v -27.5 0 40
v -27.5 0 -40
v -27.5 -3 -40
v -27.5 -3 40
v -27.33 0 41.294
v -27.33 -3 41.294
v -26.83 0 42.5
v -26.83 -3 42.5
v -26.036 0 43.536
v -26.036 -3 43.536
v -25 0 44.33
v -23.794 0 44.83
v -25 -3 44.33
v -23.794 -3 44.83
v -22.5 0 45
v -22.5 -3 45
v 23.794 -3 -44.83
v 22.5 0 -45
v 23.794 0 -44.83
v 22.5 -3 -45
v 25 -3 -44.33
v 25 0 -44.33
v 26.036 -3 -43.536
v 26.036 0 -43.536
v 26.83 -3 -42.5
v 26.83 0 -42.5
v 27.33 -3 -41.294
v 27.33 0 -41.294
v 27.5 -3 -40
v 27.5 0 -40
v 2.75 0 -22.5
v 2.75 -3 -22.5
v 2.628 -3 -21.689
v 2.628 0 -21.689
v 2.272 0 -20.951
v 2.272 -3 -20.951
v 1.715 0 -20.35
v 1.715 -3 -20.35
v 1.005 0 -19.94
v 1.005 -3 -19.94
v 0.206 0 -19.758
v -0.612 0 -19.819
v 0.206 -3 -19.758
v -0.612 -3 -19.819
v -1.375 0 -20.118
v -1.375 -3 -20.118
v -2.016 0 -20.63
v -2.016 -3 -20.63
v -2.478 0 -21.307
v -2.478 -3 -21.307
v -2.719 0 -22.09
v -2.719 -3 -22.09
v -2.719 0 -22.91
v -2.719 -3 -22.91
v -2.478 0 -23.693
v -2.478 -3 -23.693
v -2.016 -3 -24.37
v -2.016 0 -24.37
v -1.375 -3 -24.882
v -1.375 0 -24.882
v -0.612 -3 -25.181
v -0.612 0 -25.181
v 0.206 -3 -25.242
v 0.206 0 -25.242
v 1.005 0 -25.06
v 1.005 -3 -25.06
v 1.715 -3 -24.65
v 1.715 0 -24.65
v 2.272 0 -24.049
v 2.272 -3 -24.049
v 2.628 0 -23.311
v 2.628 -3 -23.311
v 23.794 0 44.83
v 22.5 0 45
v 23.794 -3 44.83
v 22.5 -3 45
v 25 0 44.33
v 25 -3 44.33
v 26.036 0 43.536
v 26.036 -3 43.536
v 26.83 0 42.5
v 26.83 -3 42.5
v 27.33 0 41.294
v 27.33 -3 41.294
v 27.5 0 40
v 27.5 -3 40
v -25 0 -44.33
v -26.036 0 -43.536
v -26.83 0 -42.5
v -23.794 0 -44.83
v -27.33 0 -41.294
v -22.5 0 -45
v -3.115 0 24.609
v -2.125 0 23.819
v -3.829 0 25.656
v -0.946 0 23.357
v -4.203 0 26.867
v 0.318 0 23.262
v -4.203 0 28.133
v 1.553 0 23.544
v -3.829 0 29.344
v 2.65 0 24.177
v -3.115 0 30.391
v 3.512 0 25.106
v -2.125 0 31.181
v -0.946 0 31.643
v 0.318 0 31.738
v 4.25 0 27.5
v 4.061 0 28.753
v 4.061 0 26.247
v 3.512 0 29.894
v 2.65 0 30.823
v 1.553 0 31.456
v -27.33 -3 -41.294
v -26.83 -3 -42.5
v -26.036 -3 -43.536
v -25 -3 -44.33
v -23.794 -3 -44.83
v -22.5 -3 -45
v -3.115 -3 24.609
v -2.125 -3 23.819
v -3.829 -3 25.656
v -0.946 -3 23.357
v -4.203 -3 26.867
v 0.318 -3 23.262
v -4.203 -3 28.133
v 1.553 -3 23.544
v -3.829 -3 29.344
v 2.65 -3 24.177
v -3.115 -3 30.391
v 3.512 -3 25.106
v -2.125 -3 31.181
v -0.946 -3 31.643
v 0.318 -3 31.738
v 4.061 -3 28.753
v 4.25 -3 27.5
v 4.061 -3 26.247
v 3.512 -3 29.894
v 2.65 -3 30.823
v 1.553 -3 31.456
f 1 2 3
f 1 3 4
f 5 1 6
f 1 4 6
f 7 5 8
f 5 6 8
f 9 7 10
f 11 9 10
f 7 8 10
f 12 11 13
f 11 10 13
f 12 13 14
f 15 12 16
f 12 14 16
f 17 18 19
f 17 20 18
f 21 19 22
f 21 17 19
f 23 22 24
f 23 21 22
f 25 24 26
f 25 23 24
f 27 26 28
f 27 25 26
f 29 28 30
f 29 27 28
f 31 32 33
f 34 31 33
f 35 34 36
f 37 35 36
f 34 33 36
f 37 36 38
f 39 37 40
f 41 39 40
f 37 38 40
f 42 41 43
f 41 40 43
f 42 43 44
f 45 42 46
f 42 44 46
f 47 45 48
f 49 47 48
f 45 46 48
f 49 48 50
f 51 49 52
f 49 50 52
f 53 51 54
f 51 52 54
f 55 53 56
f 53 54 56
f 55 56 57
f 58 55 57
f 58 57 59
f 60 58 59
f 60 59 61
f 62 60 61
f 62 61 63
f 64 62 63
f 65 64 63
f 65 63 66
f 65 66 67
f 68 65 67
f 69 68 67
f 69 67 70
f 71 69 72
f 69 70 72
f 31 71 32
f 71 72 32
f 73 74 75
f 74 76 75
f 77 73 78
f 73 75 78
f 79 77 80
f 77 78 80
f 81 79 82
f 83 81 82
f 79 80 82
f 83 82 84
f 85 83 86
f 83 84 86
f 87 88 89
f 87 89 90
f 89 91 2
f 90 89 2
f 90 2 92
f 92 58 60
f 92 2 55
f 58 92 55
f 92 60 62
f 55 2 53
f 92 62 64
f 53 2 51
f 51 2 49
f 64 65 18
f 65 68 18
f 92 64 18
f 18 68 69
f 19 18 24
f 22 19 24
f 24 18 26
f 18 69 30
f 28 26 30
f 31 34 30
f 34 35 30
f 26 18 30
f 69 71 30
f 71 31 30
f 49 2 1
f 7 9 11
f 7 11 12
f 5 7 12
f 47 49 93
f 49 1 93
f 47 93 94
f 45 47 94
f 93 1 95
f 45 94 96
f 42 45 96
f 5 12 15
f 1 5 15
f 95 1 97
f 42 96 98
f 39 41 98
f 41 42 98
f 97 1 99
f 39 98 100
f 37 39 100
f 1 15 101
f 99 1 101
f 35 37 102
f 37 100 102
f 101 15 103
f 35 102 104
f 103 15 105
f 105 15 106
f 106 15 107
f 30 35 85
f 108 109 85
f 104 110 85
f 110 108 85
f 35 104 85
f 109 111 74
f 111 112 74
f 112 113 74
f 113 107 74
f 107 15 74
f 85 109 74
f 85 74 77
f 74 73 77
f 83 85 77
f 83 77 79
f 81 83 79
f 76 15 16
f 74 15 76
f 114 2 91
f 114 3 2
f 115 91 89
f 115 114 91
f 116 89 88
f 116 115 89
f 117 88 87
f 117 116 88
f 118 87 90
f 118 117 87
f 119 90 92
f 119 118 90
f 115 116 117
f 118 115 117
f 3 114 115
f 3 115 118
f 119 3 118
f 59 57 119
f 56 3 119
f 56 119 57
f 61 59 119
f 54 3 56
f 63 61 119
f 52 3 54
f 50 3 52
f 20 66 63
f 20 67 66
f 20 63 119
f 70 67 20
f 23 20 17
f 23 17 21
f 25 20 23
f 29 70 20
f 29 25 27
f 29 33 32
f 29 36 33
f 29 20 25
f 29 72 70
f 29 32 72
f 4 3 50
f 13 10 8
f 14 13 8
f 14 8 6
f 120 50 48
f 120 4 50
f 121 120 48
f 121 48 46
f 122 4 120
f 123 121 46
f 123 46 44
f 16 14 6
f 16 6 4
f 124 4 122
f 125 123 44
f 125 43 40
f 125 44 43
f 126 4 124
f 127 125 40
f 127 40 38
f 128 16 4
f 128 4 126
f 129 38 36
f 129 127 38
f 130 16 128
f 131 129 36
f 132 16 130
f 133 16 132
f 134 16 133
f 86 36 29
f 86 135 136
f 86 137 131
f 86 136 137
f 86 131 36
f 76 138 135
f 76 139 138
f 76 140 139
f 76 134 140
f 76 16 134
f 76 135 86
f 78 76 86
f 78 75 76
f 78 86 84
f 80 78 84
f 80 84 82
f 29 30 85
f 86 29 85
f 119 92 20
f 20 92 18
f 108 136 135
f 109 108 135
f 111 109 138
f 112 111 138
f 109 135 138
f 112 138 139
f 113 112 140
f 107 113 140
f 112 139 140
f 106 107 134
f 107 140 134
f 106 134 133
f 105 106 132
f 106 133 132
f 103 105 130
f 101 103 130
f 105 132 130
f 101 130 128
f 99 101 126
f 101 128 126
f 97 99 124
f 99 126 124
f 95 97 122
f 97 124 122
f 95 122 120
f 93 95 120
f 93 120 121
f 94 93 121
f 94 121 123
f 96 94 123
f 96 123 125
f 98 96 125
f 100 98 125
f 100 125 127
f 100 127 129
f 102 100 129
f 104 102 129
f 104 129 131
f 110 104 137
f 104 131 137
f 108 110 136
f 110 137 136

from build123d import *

# Parameters (mm, degrees)
F0_W     = 55
F0_H     = 90
F1_DEPTH = 3
F2_R     = 4.25
F3_DEPTH = 3
F4_R     = 5
F5_R     = 2.75
F6_DEPTH = 3


with BuildPart() as f1:
    # F0 (on Front) → F1 (new body)
    with BuildSketch(Plane.XZ):
        Rectangle(F0_W, F0_H)
    extrude(amount=F1_DEPTH)

    # F2 (on face) → F3 (cut, through all)
    with BuildSketch(Plane.XZ.offset(3)):
        with Locations((0, 27.5)):
            Circle(F2_R)
    extrude(amount=-F3_DEPTH, mode=Mode.SUBTRACT)

    # F4
    f4_edges = [f1.edges().sort_by_distance(p)[0] for p in [
        (-27.5, -1.5, 45),
        (27.5, -1.5, 45),
        (27.5, -1.5, -45),
        (-27.5, -1.5, -45),
    ]]
    fillet(f4_edges, radius=F4_R)

    # F5 (on face) → F6 (cut, through all)
    with BuildSketch(Plane.XZ.offset(3)):
        with Locations((0, -22.5)):
            Circle(F5_R)
    extrude(amount=-F6_DEPTH, mode=Mode.SUBTRACT)


solid = f1.part
